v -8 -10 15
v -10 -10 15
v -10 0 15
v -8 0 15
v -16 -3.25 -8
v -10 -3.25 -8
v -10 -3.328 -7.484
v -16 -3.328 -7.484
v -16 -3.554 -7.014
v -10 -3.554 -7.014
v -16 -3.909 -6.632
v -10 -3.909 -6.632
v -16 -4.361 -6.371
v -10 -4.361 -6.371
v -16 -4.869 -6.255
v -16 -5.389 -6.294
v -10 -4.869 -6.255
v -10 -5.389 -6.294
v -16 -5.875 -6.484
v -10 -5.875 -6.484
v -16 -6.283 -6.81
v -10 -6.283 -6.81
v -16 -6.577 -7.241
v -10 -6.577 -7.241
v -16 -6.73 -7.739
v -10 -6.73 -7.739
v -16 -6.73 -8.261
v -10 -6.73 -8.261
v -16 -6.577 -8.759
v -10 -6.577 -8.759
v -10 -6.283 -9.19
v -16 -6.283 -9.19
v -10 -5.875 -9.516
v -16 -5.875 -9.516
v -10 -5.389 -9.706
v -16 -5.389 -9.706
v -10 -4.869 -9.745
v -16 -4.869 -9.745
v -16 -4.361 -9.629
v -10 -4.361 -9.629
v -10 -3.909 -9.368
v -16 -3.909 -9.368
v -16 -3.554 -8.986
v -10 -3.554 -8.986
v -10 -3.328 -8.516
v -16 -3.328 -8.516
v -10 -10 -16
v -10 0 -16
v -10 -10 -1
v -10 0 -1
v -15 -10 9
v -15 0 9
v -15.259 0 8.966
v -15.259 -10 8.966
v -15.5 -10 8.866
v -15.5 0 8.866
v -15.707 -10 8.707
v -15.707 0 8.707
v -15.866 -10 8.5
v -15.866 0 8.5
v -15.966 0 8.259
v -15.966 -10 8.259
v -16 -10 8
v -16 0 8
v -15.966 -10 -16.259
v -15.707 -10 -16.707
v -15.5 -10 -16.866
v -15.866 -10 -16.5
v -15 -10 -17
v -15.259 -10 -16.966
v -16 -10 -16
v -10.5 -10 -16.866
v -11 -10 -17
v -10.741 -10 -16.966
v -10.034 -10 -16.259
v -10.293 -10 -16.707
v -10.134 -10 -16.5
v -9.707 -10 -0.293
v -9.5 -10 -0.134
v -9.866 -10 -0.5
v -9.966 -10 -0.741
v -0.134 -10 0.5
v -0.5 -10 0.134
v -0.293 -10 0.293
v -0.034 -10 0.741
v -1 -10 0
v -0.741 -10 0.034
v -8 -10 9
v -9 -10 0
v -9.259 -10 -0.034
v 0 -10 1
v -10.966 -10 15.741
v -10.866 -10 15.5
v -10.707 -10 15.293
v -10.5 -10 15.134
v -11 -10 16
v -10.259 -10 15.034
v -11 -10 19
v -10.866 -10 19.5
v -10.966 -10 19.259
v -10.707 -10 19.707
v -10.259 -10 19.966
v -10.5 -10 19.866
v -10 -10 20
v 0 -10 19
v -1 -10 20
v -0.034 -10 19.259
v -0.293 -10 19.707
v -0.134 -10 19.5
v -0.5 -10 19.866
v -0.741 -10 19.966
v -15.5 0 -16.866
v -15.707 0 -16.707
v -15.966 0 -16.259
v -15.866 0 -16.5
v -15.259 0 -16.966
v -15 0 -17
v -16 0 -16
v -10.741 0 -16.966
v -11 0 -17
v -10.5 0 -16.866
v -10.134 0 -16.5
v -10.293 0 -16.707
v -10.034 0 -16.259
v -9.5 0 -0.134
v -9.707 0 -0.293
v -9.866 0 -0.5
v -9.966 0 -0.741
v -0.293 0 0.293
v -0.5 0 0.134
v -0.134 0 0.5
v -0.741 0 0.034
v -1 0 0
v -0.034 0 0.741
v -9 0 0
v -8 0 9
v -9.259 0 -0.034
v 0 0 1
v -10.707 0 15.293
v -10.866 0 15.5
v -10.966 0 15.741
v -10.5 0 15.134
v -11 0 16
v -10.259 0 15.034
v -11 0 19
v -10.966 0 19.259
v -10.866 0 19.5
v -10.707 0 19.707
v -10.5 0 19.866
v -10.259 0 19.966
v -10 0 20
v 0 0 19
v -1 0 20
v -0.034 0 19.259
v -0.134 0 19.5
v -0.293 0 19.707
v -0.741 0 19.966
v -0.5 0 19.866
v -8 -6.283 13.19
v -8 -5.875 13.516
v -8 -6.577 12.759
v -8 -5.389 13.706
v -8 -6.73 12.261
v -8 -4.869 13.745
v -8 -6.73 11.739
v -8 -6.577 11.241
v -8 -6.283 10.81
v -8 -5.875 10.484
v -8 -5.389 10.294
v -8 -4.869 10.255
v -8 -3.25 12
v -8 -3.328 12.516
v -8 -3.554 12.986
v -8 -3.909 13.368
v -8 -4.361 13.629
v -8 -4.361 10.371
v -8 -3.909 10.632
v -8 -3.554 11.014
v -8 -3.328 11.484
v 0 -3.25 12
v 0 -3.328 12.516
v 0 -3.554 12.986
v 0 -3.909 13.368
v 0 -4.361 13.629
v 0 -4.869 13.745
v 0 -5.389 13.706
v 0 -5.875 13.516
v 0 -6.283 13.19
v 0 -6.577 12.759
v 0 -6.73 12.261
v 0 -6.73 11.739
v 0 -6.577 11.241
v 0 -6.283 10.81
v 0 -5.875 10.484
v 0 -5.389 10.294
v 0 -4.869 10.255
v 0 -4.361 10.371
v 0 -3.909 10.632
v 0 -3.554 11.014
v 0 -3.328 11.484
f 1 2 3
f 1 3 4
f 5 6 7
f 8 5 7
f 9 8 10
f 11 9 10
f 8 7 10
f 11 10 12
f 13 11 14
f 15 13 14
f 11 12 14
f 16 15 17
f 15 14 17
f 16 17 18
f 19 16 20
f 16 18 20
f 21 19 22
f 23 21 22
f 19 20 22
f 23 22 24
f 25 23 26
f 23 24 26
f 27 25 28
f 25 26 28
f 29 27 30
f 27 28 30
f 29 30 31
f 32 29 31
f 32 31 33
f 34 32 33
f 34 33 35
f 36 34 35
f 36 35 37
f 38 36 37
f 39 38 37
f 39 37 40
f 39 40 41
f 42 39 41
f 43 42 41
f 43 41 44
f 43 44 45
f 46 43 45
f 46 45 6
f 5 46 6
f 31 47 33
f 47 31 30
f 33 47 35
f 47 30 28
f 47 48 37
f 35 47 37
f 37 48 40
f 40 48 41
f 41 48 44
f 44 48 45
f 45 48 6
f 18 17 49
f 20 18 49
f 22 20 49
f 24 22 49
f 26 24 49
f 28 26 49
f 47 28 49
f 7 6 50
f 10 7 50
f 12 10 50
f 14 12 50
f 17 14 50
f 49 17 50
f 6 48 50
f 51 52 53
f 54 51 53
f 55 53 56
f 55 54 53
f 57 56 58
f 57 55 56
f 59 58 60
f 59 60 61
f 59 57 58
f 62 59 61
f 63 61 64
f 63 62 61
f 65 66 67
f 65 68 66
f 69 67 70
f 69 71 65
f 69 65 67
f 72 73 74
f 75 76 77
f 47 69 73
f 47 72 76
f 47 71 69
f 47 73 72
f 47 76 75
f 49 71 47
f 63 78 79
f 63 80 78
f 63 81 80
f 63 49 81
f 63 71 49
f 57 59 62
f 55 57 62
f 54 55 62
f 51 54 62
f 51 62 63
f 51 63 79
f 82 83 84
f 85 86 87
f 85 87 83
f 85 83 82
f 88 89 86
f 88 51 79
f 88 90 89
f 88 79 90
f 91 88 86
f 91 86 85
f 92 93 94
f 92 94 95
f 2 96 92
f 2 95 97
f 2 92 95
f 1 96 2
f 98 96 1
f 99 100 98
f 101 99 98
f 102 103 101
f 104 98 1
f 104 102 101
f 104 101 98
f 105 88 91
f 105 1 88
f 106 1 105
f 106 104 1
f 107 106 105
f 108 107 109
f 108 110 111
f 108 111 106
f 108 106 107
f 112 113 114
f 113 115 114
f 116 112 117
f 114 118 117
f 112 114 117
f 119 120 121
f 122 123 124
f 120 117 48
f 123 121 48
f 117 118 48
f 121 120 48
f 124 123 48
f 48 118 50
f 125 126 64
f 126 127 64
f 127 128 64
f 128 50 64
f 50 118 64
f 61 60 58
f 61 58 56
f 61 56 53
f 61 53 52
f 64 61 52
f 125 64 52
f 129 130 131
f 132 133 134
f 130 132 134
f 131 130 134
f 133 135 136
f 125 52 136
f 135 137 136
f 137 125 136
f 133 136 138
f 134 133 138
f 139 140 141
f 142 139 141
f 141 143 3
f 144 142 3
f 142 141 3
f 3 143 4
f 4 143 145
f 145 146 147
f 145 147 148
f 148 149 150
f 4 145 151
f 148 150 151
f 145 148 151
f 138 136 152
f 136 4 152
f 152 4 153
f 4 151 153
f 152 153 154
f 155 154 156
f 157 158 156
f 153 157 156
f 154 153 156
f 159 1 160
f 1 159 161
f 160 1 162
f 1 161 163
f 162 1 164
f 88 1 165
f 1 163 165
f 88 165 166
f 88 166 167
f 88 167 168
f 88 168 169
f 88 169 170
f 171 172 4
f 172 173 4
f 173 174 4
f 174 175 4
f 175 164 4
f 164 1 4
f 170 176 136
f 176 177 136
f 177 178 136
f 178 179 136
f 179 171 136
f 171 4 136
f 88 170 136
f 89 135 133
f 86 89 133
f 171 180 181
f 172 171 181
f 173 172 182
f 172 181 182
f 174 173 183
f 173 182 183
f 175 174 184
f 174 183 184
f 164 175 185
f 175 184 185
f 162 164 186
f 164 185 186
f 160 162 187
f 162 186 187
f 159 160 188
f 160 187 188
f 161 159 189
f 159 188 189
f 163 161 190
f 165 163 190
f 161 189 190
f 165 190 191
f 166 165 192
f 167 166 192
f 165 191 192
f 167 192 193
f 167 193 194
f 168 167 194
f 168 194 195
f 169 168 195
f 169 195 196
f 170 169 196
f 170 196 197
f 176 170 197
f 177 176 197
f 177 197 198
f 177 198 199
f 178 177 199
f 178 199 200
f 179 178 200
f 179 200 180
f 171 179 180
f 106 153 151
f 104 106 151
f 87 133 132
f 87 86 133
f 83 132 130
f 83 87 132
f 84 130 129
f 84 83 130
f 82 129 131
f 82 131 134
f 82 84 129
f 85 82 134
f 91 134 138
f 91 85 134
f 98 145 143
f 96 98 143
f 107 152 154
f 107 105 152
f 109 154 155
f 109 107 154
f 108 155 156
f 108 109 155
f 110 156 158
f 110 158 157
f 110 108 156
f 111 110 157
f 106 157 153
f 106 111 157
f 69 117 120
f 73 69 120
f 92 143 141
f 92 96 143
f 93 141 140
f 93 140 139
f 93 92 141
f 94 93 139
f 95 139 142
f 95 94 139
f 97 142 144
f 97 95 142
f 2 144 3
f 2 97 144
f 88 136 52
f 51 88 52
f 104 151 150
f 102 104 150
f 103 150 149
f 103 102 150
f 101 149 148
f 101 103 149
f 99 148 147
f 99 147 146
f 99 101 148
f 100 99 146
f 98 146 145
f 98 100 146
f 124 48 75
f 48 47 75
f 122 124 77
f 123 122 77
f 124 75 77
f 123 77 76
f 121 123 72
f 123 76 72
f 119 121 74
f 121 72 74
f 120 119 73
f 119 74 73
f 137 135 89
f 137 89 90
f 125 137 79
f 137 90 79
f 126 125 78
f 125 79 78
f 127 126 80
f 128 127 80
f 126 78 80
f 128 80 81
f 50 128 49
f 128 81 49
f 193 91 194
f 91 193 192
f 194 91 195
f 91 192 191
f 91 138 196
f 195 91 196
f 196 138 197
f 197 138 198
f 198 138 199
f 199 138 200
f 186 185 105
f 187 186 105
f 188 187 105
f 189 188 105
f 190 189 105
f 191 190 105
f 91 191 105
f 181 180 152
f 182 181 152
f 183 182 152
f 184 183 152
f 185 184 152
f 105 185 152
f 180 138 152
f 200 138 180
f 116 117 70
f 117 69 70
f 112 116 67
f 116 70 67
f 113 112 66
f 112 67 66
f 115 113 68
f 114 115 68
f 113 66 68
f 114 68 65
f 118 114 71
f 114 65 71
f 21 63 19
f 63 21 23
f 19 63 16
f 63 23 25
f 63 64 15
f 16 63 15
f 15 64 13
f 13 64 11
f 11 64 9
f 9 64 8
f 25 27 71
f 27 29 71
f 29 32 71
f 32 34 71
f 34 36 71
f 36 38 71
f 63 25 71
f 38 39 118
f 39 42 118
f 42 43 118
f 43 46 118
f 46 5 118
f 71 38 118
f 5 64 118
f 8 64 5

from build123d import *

# Parameters (mm, degrees)
F1_DEPTH = 10
F3_D     = 3.5
F4_R     = 1
F6_D     = 3.5


with BuildPart() as f1:
    # F0 (on Front) → F1 (new body)
    with BuildSketch(Plane.XZ):
        Polygon((-10, 0), (0, 0), (0, 20), (-11, 20), (-11, 15), (-8, 15), (-8, 9), (-16, 9), (-16, -17), (-10, -17), align=None)
    extrude(amount=F1_DEPTH)

    # F3 (through all)
    with Locations(Plane(origin=(-8, 0, 0), x_dir=(0, -1, 0), z_dir=(-1, 0, 0))):
        with Locations((5, 12)):
            Hole(F3_D / 2)

    # F4
    f4_edges = [f1.edges().sort_by_distance(p)[0] for p in [
        (-11, -5, 20),
        (-11, -5, 15),
        (-16, -5, 9),
        (-16, -5, -17),
        (-10, -5, -17),
        (-10, -5, 0),
        (0, -5, 0),
        (0, -5, 20),
    ]]
    fillet(f4_edges, radius=F4_R)

    # F6 (through all)
    with Locations(Plane(origin=(-16, 0, 0), x_dir=(0, -1, 0), z_dir=(-1, 0, 0))):
        with Locations((5, -8)):
            Hole(F6_D / 2)


solid = f1.part
